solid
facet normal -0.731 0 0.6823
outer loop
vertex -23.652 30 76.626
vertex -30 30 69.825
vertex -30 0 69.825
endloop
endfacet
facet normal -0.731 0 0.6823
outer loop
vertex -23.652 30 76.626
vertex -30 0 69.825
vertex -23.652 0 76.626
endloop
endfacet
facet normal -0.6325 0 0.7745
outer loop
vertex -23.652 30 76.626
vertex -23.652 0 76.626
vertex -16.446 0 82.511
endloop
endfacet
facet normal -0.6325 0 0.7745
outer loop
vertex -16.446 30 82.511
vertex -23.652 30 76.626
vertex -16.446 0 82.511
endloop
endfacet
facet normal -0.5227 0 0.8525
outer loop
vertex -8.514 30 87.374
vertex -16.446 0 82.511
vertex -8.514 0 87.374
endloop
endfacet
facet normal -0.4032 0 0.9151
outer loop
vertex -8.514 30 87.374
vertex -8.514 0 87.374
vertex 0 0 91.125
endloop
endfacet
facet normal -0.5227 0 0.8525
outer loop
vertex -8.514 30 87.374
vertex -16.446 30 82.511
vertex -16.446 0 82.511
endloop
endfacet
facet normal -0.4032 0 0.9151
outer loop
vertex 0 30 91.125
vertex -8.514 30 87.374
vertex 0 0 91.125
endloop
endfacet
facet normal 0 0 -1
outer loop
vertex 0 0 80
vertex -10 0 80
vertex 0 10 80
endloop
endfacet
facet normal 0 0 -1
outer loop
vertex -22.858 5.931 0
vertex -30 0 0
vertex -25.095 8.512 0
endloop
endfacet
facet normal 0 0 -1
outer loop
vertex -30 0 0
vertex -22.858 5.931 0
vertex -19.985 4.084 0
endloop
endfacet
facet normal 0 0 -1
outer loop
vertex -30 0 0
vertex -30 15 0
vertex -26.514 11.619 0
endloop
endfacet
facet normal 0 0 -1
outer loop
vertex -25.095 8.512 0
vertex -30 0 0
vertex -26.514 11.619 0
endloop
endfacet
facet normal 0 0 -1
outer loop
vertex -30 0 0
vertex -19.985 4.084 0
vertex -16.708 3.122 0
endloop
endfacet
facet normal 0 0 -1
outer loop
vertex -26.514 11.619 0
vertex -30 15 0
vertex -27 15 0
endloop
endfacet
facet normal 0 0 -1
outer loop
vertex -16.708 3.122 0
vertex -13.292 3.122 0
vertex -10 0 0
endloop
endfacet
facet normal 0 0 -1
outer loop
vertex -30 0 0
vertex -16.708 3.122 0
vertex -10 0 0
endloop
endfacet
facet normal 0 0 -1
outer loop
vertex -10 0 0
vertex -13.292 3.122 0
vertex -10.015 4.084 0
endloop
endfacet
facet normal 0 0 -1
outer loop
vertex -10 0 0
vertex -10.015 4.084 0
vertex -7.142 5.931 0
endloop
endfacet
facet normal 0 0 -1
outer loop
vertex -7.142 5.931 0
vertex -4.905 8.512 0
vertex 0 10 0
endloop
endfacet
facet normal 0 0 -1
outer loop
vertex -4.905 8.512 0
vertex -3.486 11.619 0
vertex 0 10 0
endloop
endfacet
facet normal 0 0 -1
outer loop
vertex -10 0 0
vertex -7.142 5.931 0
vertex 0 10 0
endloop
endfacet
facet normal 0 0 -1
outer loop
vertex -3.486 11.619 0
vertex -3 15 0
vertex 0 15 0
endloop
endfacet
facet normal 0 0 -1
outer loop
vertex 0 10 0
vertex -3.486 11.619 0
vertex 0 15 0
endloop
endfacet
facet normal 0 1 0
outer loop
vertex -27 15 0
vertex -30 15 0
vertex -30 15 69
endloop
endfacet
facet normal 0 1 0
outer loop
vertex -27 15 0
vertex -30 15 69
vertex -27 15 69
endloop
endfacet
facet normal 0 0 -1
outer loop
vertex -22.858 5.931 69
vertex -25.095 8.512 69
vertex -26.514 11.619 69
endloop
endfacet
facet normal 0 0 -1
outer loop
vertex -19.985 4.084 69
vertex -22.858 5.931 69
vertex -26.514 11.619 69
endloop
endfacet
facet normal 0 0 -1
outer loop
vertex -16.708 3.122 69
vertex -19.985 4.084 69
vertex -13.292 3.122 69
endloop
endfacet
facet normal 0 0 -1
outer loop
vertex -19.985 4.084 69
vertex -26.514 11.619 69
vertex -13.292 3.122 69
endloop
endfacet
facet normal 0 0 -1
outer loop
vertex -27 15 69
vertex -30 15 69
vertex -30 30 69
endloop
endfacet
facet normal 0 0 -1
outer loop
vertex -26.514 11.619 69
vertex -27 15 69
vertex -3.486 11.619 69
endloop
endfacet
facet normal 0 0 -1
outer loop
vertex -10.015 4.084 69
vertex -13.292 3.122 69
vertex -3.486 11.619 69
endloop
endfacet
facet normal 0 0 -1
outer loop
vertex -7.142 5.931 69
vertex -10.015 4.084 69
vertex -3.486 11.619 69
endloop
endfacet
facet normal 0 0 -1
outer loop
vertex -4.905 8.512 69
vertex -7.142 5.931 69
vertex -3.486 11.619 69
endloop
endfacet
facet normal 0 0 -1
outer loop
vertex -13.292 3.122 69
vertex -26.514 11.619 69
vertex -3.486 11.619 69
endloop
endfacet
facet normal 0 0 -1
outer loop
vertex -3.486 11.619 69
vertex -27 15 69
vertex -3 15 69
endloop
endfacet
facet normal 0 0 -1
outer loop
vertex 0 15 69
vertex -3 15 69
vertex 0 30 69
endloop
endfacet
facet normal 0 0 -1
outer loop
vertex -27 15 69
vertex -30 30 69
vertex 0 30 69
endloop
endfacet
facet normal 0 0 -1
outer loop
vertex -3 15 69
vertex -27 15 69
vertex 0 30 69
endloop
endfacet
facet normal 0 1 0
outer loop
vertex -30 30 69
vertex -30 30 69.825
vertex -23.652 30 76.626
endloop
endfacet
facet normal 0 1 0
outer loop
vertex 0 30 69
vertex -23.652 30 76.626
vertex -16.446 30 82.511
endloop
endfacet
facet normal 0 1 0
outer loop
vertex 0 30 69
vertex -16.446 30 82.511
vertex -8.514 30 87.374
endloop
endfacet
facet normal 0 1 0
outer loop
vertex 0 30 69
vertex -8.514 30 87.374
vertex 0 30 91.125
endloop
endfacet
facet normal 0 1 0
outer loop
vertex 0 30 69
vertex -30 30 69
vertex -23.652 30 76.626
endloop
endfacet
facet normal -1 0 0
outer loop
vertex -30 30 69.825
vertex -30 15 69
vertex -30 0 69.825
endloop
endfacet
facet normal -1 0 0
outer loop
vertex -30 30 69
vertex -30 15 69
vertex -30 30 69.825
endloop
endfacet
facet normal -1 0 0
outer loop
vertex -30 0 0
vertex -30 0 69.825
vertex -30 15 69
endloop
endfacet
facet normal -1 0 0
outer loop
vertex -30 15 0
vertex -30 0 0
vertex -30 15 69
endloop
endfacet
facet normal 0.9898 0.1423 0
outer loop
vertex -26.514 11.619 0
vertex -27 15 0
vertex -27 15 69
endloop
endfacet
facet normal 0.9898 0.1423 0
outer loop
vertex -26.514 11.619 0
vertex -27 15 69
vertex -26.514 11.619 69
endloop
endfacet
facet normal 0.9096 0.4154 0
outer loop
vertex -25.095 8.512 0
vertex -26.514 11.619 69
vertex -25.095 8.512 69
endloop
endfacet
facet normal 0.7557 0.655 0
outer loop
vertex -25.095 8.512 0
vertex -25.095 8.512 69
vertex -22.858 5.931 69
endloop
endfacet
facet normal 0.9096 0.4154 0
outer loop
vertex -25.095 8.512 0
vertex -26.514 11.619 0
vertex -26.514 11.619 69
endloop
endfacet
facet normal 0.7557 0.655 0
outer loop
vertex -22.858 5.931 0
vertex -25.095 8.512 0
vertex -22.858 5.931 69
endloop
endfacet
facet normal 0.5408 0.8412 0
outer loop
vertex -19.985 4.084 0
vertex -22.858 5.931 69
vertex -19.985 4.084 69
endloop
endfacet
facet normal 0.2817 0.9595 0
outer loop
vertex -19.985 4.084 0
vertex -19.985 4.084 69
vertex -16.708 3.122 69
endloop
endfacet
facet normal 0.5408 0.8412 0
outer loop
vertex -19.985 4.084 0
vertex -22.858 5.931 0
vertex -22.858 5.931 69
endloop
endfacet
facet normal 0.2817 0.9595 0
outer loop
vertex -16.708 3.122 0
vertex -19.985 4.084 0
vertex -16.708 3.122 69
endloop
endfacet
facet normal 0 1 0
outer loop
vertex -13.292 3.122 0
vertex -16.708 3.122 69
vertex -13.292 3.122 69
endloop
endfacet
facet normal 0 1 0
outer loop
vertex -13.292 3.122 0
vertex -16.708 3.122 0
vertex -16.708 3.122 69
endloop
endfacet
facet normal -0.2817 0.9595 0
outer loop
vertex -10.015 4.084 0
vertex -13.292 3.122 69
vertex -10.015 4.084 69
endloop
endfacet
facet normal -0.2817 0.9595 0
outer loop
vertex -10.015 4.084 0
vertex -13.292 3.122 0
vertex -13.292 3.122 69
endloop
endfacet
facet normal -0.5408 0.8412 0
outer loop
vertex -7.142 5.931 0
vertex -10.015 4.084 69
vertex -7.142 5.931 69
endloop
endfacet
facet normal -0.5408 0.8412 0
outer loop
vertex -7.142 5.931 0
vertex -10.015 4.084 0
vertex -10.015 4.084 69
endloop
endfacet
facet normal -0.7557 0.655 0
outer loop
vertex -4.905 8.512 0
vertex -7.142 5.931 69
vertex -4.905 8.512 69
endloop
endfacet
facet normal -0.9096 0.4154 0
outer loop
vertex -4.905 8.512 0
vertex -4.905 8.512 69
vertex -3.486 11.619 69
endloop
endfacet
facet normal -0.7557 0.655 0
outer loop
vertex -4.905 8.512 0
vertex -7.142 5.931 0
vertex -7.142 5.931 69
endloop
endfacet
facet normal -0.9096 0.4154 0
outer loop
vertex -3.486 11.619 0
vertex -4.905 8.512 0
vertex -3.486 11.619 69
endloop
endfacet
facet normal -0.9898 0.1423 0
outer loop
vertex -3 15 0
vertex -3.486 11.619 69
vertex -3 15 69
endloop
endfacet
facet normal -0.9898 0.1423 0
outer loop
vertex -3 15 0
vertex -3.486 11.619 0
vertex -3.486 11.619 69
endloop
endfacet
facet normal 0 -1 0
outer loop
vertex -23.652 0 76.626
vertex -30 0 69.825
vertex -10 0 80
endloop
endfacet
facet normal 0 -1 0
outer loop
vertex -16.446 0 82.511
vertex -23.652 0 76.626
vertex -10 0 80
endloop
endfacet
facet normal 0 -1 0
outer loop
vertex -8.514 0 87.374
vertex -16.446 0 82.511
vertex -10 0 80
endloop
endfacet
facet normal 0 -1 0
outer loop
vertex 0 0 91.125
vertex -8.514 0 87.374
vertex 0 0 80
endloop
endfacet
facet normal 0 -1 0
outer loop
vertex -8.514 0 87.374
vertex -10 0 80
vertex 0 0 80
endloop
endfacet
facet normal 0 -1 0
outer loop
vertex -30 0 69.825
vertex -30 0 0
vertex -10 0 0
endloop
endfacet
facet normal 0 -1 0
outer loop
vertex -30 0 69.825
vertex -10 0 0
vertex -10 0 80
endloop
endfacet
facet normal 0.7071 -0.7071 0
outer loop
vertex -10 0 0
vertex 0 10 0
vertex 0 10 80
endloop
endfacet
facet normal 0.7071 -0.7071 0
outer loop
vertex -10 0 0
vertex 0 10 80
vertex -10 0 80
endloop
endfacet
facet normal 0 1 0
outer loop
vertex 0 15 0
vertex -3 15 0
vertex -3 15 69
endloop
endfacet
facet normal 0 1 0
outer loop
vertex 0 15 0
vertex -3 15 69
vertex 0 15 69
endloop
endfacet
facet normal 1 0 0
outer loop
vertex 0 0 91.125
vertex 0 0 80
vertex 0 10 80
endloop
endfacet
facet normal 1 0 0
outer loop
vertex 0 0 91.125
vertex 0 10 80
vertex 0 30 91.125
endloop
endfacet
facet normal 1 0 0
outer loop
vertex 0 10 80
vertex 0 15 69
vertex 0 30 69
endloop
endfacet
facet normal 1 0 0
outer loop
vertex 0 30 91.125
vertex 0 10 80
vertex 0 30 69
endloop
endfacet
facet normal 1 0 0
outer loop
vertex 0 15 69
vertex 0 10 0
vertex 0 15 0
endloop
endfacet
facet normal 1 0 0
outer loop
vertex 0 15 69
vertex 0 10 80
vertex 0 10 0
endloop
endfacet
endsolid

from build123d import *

# Parameters (mm, degrees)
SKETCH2_W           = 30
SKETCH2_H           = 30
BOSS_EXTRUDE1_DEPTH = 100
CUT_EXTRUDE1_START  = -30
CUT_EXTRUDE1_DEPTH  = 30
CUT_EXTRUDE2_DEPTH  = 69
CUT_EXTRUDE3_DEPTH  = 80


# Read off the part's stored shape, not the designer's step: Cut-Extrude1
with BuildPart() as part:
    # Sketch2 → Boss-Extrude1 (new body)
    with BuildSketch(Plane.XY):
        with Locations((-15, 15)):
            Rectangle(SKETCH2_W, SKETCH2_H)
    extrude(amount=BOSS_EXTRUDE1_DEPTH)

    # Cut-Extrude1 outline → Cut-Extrude1 (cut)
    with BuildSketch(Plane.XZ.offset(CUT_EXTRUDE1_START)):
        with BuildLine():
            ThreePointArc((-30, 69.824648593), (-16.445900415, 82.511221459), (0, 91.124879576))
            Line((0, 91.124879576), (0, 100))
            Line((0, 100), (-30, 100))
            Line((-30, 100), (-30, 69.824648593))
        make_face()
    extrude(amount=CUT_EXTRUDE1_DEPTH, mode=Mode.SUBTRACT)

    # Sketch4 → Cut-Extrude2 (cut)
    with BuildSketch(Plane(origin=(0, 0, 0), x_dir=(-1, 0, 0), z_dir=(0, 0, -1))):
        with BuildLine():
            Line((3, 15), (0, 15))
            Line((0, 15), (0, 30))
            Line((0, 30), (30, 30))
            Line((30, 30), (30, 15))
            Line((30, 15), (27, 15))
            ThreePointArc((27, 15), (15, 3), (3, 15))
        make_face()
    extrude(amount=-CUT_EXTRUDE2_DEPTH, mode=Mode.SUBTRACT)

    # Sketch5 → Cut-Extrude3 (cut)
    with BuildSketch(Plane(origin=(0, 0, 0), x_dir=(-1, 0, 0), z_dir=(0, 0, -1))):
        Polygon((0, 0), (0, 10), (10, 0), align=None)
    extrude(amount=-CUT_EXTRUDE3_DEPTH, mode=Mode.SUBTRACT)


solid = part.part
